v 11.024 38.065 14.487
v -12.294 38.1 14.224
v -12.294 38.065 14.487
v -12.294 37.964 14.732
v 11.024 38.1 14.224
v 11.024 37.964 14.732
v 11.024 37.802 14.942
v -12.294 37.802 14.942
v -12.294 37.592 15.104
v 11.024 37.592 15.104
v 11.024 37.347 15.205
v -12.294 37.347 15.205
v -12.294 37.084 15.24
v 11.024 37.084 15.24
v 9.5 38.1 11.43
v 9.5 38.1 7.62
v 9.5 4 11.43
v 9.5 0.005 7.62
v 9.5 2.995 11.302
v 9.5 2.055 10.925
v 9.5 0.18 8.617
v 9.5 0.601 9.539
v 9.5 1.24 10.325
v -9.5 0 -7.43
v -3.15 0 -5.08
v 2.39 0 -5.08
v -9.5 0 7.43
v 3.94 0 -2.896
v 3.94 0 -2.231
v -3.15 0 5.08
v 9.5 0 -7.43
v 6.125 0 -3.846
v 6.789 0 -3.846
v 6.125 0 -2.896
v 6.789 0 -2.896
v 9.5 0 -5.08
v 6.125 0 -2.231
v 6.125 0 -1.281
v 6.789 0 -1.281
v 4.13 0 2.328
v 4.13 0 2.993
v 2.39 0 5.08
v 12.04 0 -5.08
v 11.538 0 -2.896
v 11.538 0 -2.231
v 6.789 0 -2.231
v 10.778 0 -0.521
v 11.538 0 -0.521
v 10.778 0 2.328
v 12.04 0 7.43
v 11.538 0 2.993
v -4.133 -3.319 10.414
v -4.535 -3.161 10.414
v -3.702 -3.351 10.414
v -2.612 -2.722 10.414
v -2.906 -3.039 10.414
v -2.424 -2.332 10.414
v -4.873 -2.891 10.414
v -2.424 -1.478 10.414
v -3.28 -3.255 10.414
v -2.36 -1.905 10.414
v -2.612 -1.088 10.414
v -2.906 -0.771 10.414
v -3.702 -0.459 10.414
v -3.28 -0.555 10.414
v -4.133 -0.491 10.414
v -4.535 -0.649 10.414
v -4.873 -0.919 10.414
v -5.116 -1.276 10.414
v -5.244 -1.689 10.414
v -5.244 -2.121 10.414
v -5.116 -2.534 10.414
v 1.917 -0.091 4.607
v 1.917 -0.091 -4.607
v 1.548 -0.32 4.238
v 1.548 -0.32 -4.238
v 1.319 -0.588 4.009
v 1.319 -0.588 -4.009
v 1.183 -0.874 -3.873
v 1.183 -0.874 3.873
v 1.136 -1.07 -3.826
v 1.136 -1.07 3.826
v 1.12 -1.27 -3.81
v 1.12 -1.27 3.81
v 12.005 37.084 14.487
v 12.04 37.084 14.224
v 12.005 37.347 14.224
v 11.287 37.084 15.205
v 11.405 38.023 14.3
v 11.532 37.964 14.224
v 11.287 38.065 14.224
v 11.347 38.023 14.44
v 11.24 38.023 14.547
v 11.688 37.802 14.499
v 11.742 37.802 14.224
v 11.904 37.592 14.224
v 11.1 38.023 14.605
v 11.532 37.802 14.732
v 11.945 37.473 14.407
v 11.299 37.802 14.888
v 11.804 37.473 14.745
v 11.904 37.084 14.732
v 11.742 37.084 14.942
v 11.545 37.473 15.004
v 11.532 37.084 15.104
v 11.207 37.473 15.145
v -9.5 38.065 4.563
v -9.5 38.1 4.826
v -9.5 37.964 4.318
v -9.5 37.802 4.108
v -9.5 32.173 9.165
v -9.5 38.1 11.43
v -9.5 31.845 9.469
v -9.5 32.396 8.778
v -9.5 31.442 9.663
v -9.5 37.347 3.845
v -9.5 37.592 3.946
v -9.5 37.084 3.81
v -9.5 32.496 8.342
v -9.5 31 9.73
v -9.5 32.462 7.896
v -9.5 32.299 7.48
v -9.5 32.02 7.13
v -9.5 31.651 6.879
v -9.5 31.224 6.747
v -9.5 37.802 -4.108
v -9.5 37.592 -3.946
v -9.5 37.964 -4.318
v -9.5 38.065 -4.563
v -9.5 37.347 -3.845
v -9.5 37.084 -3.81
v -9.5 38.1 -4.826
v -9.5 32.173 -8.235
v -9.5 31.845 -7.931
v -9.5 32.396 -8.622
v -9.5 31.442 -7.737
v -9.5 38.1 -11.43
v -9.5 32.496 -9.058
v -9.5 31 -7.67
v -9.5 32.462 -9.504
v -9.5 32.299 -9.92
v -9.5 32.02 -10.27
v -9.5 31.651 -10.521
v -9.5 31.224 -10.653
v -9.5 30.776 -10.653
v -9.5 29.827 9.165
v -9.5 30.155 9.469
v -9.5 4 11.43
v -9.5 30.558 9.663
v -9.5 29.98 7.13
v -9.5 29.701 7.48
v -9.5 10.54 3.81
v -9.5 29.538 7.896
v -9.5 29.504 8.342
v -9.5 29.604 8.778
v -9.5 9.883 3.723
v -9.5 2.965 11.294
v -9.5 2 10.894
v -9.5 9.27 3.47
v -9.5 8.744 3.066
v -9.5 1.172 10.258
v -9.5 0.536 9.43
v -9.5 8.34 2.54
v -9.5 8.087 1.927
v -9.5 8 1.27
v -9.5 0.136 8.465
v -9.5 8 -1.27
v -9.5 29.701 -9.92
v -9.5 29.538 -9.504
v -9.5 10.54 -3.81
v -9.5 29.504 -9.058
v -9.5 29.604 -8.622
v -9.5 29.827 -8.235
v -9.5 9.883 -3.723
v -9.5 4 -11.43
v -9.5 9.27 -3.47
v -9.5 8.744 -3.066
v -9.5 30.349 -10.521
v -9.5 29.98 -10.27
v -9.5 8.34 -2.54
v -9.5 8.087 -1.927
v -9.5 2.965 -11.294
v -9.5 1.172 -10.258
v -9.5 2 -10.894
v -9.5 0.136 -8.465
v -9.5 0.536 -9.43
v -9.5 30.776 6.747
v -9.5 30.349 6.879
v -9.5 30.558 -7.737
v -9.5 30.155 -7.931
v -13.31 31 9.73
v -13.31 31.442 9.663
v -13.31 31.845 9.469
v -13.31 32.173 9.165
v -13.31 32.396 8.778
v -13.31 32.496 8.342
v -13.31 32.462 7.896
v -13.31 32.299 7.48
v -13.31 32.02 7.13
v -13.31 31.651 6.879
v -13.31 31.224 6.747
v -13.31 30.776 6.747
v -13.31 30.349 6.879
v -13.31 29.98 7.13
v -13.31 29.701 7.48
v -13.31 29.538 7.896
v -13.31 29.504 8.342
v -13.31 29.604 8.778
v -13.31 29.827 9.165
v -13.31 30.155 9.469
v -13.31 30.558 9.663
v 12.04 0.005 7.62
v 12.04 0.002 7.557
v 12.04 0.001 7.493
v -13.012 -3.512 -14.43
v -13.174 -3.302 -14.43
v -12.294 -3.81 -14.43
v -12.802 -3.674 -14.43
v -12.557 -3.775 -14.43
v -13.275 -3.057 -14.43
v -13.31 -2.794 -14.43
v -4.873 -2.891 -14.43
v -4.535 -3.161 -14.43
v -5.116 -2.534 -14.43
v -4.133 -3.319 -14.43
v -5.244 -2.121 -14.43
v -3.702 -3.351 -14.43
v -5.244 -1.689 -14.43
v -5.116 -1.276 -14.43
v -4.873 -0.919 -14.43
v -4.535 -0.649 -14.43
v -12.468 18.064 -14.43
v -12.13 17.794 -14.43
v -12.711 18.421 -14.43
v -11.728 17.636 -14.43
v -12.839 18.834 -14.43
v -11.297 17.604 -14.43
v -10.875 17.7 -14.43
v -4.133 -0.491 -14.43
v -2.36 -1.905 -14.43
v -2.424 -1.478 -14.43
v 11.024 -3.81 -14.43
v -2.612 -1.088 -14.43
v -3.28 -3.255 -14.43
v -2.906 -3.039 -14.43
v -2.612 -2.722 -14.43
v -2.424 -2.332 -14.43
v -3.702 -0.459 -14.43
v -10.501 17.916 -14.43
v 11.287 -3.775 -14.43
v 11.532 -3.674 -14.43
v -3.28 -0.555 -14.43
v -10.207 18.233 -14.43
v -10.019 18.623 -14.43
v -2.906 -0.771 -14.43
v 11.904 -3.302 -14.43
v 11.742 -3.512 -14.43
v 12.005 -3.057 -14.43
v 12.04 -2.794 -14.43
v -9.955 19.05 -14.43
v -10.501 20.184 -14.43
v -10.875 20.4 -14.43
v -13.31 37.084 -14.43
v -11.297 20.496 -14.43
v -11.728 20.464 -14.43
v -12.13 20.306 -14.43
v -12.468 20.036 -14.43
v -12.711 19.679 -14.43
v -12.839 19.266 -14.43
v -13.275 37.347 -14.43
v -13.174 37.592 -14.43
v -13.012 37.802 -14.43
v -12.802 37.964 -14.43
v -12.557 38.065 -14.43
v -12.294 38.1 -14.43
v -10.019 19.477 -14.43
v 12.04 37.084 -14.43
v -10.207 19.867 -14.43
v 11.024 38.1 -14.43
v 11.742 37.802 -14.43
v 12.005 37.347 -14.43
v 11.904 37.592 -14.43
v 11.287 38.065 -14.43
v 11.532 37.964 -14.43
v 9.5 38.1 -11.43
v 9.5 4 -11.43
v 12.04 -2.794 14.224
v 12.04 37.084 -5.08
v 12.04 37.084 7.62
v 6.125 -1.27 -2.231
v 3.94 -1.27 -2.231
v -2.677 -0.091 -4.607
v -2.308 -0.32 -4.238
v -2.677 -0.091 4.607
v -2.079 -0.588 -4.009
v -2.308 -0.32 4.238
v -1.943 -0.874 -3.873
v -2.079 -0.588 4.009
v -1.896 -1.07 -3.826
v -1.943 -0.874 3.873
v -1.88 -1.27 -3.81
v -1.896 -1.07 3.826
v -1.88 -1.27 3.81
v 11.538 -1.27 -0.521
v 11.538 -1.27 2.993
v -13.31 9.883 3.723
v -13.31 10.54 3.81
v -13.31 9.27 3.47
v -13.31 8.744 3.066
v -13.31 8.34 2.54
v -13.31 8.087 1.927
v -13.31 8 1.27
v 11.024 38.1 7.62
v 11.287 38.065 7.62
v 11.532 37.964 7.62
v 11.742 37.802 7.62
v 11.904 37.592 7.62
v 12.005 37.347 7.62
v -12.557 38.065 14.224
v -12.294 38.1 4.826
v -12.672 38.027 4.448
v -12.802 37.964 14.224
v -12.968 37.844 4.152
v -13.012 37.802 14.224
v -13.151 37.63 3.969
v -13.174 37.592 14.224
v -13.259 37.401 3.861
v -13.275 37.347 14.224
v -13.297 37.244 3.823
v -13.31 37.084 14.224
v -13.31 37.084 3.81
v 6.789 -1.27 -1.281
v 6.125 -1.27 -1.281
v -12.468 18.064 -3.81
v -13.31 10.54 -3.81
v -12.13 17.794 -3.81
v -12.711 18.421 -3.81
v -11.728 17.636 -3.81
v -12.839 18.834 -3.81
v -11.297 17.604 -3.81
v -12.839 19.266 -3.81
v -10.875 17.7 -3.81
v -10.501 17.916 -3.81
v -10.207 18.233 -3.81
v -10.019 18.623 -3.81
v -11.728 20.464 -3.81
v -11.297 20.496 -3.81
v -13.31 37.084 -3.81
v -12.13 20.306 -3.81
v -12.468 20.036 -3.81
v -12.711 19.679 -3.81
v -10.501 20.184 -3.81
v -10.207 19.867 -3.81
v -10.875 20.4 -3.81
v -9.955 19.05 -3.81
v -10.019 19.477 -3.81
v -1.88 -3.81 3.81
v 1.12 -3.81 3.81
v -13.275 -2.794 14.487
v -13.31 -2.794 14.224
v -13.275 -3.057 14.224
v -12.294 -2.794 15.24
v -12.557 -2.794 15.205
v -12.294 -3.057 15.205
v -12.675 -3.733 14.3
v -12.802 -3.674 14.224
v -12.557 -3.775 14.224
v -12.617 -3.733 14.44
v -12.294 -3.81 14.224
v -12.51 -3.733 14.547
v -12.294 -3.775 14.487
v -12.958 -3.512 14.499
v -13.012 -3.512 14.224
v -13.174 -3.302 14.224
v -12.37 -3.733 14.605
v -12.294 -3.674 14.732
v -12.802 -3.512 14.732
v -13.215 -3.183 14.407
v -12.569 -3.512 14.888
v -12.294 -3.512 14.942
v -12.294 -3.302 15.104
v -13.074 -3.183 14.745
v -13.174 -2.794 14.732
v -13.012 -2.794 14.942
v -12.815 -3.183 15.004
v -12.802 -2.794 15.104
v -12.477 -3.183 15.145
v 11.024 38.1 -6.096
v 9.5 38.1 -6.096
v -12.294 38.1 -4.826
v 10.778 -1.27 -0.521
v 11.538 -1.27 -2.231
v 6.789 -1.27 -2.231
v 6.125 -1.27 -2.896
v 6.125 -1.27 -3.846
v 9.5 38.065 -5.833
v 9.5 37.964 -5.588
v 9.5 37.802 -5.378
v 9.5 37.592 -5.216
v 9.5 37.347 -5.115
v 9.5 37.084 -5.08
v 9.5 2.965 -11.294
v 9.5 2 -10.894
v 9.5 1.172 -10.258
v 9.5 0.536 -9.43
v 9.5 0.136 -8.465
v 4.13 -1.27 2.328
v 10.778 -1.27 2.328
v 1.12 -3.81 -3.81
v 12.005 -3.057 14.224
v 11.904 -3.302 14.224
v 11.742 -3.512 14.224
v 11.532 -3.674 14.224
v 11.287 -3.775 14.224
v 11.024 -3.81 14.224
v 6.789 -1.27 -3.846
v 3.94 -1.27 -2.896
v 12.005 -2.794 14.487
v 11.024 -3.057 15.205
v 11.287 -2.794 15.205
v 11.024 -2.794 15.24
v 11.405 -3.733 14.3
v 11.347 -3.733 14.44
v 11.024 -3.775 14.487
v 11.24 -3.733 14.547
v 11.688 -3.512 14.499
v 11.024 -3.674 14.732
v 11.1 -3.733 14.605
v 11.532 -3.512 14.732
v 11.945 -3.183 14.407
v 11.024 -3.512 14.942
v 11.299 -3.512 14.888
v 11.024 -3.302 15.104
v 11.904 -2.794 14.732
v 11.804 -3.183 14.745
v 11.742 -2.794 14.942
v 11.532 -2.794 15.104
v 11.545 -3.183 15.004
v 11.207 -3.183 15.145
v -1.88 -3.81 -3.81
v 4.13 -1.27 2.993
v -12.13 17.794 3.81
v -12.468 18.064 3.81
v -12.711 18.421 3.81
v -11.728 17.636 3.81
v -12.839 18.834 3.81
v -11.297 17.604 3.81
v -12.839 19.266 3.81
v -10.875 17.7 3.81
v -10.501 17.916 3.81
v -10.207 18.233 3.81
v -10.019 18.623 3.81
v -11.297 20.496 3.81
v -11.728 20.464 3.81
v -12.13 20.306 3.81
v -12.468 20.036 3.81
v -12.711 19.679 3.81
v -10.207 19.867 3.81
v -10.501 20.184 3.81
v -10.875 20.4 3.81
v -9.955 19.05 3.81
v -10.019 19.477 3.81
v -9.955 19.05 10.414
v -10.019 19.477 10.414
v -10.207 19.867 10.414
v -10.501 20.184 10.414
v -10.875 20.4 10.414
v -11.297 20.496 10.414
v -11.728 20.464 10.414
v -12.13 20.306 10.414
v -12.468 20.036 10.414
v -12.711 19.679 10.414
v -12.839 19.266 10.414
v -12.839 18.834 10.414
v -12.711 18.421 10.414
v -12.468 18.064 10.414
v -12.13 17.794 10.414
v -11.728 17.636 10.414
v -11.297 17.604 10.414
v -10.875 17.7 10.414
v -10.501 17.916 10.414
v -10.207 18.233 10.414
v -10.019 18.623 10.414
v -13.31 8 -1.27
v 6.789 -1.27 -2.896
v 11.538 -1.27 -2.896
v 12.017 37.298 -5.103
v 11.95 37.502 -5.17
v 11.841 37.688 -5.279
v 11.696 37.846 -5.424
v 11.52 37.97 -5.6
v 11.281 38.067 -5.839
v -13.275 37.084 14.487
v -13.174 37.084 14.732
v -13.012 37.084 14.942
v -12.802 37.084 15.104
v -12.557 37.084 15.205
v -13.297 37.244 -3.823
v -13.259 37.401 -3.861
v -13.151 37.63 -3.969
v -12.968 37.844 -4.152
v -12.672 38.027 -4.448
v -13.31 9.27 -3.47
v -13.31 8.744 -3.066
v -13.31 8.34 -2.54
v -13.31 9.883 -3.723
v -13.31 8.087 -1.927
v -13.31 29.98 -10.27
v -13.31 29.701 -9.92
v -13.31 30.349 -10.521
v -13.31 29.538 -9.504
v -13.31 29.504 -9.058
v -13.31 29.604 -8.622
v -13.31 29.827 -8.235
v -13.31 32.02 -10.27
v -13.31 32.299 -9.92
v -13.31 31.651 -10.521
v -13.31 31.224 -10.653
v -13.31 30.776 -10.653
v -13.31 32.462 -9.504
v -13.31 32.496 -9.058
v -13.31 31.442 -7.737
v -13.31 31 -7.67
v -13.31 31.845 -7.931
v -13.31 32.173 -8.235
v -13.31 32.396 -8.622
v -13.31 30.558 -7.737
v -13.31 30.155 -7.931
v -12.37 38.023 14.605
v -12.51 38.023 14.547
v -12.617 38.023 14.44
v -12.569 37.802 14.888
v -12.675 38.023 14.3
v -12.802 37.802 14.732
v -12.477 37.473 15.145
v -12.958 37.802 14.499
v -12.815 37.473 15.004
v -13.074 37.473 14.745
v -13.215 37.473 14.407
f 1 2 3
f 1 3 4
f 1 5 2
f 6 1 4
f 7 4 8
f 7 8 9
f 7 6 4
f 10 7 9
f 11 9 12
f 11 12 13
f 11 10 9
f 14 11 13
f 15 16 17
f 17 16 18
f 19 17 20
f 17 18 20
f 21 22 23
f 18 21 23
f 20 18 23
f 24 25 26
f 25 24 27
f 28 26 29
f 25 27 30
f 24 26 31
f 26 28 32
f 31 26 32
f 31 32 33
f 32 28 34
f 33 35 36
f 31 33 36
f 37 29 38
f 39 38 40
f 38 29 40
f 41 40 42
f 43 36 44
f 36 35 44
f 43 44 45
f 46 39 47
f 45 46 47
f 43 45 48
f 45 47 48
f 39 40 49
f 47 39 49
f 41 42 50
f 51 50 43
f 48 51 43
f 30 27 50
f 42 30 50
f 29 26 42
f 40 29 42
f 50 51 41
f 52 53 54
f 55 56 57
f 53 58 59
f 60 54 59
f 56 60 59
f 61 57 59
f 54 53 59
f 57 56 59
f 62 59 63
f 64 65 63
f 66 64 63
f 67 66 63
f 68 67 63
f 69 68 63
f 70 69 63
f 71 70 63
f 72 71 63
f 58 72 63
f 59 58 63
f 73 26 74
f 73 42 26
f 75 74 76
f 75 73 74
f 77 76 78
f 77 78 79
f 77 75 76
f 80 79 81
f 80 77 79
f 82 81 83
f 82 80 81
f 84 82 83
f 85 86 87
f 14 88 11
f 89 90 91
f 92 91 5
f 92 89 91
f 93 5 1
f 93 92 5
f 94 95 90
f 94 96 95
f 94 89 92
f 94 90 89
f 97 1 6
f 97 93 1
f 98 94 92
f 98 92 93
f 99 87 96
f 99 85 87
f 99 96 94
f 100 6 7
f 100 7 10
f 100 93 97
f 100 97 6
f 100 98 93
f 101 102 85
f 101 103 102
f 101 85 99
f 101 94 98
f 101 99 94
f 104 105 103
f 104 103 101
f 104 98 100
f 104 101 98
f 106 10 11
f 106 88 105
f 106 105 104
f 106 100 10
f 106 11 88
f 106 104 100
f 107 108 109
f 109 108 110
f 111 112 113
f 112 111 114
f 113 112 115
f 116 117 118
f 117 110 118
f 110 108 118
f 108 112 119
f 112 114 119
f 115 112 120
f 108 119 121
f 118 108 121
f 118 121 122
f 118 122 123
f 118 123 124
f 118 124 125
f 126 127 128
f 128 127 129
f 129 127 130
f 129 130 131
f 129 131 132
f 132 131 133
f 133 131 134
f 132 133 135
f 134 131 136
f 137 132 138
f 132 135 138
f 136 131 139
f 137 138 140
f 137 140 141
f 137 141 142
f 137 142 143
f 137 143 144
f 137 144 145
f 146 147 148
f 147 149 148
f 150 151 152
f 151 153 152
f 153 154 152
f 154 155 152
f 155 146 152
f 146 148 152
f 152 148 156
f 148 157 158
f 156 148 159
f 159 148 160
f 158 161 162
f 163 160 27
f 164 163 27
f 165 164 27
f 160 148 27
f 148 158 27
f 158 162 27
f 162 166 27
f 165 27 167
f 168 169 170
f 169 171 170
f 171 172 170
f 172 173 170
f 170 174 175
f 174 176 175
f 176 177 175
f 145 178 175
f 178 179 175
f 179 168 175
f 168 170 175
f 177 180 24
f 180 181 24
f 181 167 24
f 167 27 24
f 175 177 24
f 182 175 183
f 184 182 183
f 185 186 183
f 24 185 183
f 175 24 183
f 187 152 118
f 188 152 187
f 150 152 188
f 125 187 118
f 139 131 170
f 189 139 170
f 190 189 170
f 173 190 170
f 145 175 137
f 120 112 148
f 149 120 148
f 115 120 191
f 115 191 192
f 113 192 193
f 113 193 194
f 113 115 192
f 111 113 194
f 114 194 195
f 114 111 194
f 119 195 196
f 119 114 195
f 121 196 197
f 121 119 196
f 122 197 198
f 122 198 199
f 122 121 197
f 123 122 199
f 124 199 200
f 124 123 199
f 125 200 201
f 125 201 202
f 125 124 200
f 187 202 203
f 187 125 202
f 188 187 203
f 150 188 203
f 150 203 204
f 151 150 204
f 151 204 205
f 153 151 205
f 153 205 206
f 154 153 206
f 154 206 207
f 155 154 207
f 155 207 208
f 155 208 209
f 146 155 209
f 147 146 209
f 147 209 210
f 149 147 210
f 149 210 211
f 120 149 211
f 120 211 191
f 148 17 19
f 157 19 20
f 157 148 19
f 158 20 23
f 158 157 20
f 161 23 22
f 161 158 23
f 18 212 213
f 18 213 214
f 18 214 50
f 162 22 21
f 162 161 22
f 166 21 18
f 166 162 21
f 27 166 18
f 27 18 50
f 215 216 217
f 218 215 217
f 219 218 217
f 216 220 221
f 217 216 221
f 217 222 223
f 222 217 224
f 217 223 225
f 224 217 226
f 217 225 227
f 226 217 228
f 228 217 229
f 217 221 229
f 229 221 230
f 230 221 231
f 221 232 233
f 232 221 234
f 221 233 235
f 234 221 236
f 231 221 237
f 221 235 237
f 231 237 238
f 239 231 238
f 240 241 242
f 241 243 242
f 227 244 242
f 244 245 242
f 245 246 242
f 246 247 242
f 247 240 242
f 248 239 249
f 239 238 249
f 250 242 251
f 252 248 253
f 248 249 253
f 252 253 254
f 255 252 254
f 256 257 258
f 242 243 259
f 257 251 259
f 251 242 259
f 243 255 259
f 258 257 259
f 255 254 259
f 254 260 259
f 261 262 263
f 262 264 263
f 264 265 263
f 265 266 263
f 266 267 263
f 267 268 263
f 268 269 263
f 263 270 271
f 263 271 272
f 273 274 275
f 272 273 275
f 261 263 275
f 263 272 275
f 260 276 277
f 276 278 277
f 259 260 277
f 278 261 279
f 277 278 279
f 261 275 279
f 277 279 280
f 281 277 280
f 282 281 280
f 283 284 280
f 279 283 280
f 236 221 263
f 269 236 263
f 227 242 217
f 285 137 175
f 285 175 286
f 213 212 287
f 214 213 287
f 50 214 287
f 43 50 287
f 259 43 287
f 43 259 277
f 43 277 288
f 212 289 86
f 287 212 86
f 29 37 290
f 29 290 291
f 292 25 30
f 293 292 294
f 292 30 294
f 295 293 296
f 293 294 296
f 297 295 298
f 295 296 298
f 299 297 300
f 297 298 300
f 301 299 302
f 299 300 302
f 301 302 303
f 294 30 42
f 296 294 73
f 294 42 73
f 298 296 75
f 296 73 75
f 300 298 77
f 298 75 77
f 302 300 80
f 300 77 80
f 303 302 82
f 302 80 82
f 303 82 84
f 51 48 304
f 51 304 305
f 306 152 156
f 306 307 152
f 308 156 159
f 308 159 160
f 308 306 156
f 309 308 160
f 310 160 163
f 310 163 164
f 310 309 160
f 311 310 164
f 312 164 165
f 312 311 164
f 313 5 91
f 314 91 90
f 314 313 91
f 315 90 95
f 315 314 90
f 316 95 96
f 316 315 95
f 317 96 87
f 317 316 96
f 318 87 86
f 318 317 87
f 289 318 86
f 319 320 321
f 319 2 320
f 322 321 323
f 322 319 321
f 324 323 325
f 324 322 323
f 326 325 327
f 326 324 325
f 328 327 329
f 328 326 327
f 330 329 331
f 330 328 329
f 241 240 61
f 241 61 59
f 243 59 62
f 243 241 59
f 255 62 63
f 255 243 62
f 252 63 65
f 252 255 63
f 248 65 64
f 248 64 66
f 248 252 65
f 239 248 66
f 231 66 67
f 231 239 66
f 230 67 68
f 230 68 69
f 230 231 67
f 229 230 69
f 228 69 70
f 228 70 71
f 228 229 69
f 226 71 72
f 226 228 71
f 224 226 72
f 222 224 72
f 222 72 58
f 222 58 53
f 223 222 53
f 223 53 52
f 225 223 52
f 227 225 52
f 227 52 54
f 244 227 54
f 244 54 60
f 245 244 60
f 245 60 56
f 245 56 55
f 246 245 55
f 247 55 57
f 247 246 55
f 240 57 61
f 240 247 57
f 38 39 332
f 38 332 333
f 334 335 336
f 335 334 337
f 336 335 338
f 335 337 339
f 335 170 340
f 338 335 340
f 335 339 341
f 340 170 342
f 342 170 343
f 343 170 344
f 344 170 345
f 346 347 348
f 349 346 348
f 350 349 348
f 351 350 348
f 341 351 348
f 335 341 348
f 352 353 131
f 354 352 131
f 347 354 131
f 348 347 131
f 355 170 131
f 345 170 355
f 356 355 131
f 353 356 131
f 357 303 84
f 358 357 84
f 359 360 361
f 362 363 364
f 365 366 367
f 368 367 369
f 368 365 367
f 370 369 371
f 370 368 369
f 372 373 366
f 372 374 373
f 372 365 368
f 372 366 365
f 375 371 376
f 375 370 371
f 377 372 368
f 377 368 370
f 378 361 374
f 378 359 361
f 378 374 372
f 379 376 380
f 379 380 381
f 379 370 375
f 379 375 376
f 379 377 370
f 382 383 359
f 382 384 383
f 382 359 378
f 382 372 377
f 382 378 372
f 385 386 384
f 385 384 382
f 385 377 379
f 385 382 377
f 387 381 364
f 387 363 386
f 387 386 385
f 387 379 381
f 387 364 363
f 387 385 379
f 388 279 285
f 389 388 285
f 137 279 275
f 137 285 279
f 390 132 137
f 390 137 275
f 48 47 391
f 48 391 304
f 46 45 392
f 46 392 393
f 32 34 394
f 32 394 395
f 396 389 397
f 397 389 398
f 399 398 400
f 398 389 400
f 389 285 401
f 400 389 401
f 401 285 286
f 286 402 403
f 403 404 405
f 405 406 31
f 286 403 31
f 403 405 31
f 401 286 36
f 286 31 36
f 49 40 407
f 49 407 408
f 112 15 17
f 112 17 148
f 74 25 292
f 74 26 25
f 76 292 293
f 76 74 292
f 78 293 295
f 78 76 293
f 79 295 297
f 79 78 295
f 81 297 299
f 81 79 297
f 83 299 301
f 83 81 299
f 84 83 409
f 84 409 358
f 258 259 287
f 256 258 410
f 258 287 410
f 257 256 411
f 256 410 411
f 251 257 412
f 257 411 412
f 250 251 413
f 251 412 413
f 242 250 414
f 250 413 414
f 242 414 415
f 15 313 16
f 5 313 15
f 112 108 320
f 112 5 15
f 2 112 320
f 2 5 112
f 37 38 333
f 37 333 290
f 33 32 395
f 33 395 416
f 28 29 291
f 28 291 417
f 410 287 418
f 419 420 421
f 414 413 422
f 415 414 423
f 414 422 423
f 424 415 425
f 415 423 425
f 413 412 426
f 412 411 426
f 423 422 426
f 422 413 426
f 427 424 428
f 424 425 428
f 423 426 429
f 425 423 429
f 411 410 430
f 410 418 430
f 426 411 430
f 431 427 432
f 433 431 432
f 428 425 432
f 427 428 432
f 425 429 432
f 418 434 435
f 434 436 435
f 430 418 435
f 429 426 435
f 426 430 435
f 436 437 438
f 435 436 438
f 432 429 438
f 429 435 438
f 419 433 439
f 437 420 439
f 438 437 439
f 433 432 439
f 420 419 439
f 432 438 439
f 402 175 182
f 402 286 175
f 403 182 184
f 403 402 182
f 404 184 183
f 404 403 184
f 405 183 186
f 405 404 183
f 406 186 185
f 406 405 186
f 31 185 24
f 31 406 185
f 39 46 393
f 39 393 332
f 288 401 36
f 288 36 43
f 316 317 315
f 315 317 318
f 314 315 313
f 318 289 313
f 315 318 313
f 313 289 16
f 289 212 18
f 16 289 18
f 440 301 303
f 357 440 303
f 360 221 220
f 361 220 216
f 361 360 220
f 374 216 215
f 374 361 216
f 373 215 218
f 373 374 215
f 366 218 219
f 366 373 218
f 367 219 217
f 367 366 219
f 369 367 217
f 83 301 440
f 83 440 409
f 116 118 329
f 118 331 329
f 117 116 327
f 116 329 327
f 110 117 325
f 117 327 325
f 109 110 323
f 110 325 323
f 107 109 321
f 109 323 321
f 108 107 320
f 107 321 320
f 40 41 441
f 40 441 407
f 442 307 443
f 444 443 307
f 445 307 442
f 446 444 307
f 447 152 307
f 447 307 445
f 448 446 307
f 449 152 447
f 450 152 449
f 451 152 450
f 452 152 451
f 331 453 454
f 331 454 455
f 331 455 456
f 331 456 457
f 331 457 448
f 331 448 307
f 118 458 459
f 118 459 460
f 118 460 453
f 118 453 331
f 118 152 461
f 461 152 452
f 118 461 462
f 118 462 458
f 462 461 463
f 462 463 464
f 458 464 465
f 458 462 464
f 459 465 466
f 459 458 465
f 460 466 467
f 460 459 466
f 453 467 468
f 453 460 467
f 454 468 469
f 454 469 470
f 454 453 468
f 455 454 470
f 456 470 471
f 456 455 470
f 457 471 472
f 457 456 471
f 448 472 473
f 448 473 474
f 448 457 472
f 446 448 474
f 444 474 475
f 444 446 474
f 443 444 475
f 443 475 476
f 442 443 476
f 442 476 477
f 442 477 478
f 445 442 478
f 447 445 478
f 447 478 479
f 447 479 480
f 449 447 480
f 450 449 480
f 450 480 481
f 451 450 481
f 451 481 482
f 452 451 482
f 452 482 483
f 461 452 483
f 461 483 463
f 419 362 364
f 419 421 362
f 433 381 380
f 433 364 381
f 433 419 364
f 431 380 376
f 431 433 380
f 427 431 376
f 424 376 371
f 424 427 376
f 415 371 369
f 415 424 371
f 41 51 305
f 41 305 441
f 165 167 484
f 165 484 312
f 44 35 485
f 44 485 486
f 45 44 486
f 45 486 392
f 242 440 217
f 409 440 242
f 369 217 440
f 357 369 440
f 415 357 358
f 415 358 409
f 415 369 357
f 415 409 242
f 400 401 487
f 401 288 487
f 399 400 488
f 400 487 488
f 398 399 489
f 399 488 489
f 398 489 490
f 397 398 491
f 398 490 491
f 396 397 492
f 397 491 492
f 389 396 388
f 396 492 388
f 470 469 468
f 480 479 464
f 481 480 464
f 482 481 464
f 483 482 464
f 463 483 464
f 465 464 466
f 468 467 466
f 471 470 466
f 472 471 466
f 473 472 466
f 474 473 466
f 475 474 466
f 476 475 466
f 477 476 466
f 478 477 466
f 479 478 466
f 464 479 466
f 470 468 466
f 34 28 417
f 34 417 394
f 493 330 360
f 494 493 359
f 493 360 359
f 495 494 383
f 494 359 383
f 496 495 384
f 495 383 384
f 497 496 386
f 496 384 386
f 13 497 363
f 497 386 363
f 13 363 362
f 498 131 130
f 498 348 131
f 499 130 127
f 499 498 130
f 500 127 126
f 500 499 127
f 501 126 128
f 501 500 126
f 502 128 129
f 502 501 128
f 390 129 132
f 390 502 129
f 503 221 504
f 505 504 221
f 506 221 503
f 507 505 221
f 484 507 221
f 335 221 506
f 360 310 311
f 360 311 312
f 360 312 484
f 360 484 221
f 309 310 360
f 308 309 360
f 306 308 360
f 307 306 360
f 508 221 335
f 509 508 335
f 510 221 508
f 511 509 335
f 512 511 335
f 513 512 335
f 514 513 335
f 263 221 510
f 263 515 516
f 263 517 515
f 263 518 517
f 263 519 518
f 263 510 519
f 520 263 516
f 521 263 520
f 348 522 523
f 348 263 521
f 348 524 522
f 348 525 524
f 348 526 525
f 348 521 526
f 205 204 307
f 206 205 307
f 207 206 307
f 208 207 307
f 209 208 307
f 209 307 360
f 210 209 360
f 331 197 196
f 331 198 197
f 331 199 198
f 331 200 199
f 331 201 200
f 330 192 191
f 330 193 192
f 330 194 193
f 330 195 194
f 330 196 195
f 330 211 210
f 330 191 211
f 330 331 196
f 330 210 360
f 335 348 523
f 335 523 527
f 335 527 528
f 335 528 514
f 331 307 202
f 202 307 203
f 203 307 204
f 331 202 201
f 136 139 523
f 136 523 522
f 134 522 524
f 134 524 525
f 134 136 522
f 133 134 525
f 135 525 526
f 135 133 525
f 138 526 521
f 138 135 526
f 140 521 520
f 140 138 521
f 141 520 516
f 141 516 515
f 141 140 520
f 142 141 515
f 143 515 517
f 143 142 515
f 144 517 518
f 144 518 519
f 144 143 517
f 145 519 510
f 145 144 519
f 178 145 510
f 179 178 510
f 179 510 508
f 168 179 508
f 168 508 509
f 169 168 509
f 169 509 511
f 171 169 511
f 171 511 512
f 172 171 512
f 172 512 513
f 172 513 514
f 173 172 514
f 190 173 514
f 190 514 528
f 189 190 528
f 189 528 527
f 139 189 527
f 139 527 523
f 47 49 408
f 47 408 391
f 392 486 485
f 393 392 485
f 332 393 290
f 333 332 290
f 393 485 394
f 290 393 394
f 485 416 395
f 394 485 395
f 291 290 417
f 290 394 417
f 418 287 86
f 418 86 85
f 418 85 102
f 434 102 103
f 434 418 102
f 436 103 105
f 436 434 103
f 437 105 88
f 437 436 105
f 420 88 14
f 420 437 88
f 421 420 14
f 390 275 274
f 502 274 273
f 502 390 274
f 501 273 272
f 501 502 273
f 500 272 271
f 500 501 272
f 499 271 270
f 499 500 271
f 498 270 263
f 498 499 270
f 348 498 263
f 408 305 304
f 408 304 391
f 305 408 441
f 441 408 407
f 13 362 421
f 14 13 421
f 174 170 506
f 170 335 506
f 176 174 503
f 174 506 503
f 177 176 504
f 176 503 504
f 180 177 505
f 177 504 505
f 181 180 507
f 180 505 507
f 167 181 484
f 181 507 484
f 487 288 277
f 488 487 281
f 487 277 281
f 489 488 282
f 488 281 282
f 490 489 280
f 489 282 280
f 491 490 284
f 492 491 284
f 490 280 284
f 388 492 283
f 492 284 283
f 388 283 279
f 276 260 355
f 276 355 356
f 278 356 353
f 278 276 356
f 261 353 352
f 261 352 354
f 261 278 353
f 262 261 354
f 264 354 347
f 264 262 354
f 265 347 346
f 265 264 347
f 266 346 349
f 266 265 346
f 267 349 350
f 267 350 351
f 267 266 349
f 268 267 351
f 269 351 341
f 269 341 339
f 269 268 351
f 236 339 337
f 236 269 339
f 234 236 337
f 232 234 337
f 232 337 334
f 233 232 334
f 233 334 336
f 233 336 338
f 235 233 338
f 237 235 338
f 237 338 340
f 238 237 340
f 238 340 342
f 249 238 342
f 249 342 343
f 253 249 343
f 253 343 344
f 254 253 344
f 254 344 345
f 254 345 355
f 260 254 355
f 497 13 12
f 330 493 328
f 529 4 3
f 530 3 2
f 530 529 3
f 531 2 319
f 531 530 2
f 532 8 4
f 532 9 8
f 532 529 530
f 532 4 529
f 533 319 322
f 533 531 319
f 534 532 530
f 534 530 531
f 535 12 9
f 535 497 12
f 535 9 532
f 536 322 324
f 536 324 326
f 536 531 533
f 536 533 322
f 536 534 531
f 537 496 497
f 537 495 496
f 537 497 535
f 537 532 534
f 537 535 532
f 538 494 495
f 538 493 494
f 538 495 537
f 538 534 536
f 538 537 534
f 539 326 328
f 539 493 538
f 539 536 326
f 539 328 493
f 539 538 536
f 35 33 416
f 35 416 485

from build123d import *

# Parameters (mm, degrees)
BOSS_EXTRUDE2_DEPTH = 38.1
SKETCH1_W           = 25.35
SKETCH1_H           = 29.67
BOSS_EXTRUDE3_DEPTH = 3.81
SKETCH3_W           = 3
SKETCH3_H           = 7.62
CUT_EXTRUDE1_DEPTH  = 4.81
SKETCH4_W           = 7.62
SKETCH4_H           = 30.1
CUT_EXTRUDE2_DEPTH  = 4.81
SKETCH5_R           = 1.5
CUT_EXTRUDE3_DEPTH  = 4.81
SKETCH6_R           = 1.45
CUT_EXTRUDE4_DEPTH  = 24.844
FILLET1_R           = 4
FILLET4_R           = 2.54
FILLET2_R           = 1.016
FILLET3_R           = 1.27
FILLET5_R           = 1.016
CUT_EXTRUDE5_DEPTH  = 1.27


with BuildPart() as part:
    # Sketch2 → Boss-Extrude2 (new body)
    with BuildSketch(Plane(origin=(0, 0, 0), x_dir=(1, 0, 0), z_dir=(0, 1, 0))):
        Polygon((-9.5, -11.43), (9.5, -11.43), (9.5, -5.08), (12.04, -5.08), (12.04, -14.43), (-13.31, -14.43), (-13.31, 15.24), (12.04, 15.24), (12.04, 7.62), (9.5, 7.62), (9.5, 11.43), (-9.5, 11.43), align=None)
    extrude(amount=BOSS_EXTRUDE2_DEPTH)

    # Sketch1 → Boss-Extrude3 (add)
    with BuildSketch(Plane(origin=(0, 0, 0), x_dir=(1, 0, 0), z_dir=(0, 1, 0))):
        with Locations((-0.635, 0.405)):
            Rectangle(SKETCH1_W, SKETCH1_H)
    extrude(amount=-BOSS_EXTRUDE3_DEPTH)

    # Sketch3 → Cut-Extrude1 (cut, through all)
    with BuildSketch(Plane(origin=(0, 0, 0), x_dir=(1, 0, 0), z_dir=(0, 1, 0))):
        with Locations((-0.38, 0)):
            Rectangle(SKETCH3_W, SKETCH3_H)
    extrude(amount=-CUT_EXTRUDE1_DEPTH, mode=Mode.SUBTRACT)

    # Sketch4 → Cut-Extrude2 (cut, through all)
    with BuildSketch(Plane(origin=(-9.5, 0, 0), x_dir=(0, 0, -1), z_dir=(1, 0, 0))):
        with Locations((0, 23.05)):
            Rectangle(SKETCH4_W, SKETCH4_H)
    extrude(amount=-CUT_EXTRUDE2_DEPTH, mode=Mode.SUBTRACT)

    # Sketch5 → Cut-Extrude3 (cut, through all)
    with BuildSketch(Plane(origin=(-9.5, 0, 0), x_dir=(0, 0, -1), z_dir=(1, 0, 0))):
        with Locations((-9.1700096, 31)):
            Circle(SKETCH5_R)
        with Locations((8.2299904, 31)):
            Circle(SKETCH5_R)
    extrude(amount=-CUT_EXTRUDE3_DEPTH, mode=Mode.SUBTRACT)

    # Sketch6 → Cut-Extrude4 (cut)
    with BuildSketch(Plane.XY.offset(14.43)):
        with Locations((-11.405, 19.05)):
            Circle(SKETCH6_R)
        with Locations((-3.81, -1.905)):
            Circle(SKETCH6_R)
    extrude(amount=-CUT_EXTRUDE4_DEPTH, mode=Mode.SUBTRACT)

    # Fillet1
    fillet1_edges = [part.edges().sort_by_distance(p)[0] for p in [
        (0, 0, -11.43),
        (0, 0, 11.43),
    ]]
    fillet(fillet1_edges, radius=FILLET1_R)


with BuildPart() as body_2:
    # Mirror1: mirrored copy
    add(part.part.mirror(Plane.XY))

    # Fillet4
    fillet4_edges = [body_2.edges().sort_by_distance(p)[0] for p in [
        (-11.405, 8, -3.81),
        (-11.405, 8, 3.81),
    ]]
    fillet(fillet4_edges, radius=FILLET4_R)

    # Fillet2
    fillet2_edges = [body_2.edges().sort_by_distance(p)[0] for p in [
        (-13.31, 17.145, 15.24),
        (12.04, 17.145, 15.24),
        (12.04, -3.81, 0.405),
        (-13.31, -3.81, 0.405),
        (-0.635, -3.81, 15.24),
        (12.04, 38.1, 11.43),
        (-0.635, 38.1, 15.24),
        (-13.31, 38.1, 9.525),
        (-13.31, 38.1, -9.12),
        (-11.405, 38.1, -3.81),
        (-11.405, 38.1, 3.81),
    ]]
    fillet(fillet2_edges, radius=FILLET2_R)

    # Fillet3
    fillet3_edges = [body_2.edges().sort_by_distance(p)[0] for p in [
        (-1.88, 0, 0),
        (-0.38, 0, -3.81),
        (1.12, 0, 0),
        (-0.38, 0, 3.81),
    ]]
    fillet(fillet3_edges, radius=FILLET3_R)

    # Fillet5
    fillet5_edges = [body_2.edges().sort_by_distance(p)[0] for p in [
        (12.04, 38.1, -9.755),
        (10.77, 38.1, -5.08),
    ]]
    fillet(fillet5_edges, radius=FILLET5_R)

    # Sketch7 → Cut-Extrude5 (cut)
    with BuildSketch(Plane(origin=(0, 0, 0), x_dir=(1, 0, 0), z_dir=(0, 1, 0))):
        Polygon((4.129986879, -2.992887734), (4.129986879, -2.328037307), (10.778491153, -2.328037307), (10.778491153, 0.521321667), (11.538320213, 0.521321667), (11.538320213, -2.992887734), align=None)
        Polygon((3.940029614, 2.230937052), (3.940029614, 2.895787479), (6.124538161, 2.895787479), (6.124538161, 3.845573804), (6.789388589, 3.845573804), (6.789388589, 2.895787479), (11.538320213, 2.895787479), (11.538320213, 2.230937052), (6.789388589, 2.230937052), (6.789388589, 1.281150727), (6.124538161, 1.281150727), (6.124538161, 2.230937052), align=None)
    extrude(amount=-CUT_EXTRUDE5_DEPTH, mode=Mode.SUBTRACT)


solid = body_2.part
